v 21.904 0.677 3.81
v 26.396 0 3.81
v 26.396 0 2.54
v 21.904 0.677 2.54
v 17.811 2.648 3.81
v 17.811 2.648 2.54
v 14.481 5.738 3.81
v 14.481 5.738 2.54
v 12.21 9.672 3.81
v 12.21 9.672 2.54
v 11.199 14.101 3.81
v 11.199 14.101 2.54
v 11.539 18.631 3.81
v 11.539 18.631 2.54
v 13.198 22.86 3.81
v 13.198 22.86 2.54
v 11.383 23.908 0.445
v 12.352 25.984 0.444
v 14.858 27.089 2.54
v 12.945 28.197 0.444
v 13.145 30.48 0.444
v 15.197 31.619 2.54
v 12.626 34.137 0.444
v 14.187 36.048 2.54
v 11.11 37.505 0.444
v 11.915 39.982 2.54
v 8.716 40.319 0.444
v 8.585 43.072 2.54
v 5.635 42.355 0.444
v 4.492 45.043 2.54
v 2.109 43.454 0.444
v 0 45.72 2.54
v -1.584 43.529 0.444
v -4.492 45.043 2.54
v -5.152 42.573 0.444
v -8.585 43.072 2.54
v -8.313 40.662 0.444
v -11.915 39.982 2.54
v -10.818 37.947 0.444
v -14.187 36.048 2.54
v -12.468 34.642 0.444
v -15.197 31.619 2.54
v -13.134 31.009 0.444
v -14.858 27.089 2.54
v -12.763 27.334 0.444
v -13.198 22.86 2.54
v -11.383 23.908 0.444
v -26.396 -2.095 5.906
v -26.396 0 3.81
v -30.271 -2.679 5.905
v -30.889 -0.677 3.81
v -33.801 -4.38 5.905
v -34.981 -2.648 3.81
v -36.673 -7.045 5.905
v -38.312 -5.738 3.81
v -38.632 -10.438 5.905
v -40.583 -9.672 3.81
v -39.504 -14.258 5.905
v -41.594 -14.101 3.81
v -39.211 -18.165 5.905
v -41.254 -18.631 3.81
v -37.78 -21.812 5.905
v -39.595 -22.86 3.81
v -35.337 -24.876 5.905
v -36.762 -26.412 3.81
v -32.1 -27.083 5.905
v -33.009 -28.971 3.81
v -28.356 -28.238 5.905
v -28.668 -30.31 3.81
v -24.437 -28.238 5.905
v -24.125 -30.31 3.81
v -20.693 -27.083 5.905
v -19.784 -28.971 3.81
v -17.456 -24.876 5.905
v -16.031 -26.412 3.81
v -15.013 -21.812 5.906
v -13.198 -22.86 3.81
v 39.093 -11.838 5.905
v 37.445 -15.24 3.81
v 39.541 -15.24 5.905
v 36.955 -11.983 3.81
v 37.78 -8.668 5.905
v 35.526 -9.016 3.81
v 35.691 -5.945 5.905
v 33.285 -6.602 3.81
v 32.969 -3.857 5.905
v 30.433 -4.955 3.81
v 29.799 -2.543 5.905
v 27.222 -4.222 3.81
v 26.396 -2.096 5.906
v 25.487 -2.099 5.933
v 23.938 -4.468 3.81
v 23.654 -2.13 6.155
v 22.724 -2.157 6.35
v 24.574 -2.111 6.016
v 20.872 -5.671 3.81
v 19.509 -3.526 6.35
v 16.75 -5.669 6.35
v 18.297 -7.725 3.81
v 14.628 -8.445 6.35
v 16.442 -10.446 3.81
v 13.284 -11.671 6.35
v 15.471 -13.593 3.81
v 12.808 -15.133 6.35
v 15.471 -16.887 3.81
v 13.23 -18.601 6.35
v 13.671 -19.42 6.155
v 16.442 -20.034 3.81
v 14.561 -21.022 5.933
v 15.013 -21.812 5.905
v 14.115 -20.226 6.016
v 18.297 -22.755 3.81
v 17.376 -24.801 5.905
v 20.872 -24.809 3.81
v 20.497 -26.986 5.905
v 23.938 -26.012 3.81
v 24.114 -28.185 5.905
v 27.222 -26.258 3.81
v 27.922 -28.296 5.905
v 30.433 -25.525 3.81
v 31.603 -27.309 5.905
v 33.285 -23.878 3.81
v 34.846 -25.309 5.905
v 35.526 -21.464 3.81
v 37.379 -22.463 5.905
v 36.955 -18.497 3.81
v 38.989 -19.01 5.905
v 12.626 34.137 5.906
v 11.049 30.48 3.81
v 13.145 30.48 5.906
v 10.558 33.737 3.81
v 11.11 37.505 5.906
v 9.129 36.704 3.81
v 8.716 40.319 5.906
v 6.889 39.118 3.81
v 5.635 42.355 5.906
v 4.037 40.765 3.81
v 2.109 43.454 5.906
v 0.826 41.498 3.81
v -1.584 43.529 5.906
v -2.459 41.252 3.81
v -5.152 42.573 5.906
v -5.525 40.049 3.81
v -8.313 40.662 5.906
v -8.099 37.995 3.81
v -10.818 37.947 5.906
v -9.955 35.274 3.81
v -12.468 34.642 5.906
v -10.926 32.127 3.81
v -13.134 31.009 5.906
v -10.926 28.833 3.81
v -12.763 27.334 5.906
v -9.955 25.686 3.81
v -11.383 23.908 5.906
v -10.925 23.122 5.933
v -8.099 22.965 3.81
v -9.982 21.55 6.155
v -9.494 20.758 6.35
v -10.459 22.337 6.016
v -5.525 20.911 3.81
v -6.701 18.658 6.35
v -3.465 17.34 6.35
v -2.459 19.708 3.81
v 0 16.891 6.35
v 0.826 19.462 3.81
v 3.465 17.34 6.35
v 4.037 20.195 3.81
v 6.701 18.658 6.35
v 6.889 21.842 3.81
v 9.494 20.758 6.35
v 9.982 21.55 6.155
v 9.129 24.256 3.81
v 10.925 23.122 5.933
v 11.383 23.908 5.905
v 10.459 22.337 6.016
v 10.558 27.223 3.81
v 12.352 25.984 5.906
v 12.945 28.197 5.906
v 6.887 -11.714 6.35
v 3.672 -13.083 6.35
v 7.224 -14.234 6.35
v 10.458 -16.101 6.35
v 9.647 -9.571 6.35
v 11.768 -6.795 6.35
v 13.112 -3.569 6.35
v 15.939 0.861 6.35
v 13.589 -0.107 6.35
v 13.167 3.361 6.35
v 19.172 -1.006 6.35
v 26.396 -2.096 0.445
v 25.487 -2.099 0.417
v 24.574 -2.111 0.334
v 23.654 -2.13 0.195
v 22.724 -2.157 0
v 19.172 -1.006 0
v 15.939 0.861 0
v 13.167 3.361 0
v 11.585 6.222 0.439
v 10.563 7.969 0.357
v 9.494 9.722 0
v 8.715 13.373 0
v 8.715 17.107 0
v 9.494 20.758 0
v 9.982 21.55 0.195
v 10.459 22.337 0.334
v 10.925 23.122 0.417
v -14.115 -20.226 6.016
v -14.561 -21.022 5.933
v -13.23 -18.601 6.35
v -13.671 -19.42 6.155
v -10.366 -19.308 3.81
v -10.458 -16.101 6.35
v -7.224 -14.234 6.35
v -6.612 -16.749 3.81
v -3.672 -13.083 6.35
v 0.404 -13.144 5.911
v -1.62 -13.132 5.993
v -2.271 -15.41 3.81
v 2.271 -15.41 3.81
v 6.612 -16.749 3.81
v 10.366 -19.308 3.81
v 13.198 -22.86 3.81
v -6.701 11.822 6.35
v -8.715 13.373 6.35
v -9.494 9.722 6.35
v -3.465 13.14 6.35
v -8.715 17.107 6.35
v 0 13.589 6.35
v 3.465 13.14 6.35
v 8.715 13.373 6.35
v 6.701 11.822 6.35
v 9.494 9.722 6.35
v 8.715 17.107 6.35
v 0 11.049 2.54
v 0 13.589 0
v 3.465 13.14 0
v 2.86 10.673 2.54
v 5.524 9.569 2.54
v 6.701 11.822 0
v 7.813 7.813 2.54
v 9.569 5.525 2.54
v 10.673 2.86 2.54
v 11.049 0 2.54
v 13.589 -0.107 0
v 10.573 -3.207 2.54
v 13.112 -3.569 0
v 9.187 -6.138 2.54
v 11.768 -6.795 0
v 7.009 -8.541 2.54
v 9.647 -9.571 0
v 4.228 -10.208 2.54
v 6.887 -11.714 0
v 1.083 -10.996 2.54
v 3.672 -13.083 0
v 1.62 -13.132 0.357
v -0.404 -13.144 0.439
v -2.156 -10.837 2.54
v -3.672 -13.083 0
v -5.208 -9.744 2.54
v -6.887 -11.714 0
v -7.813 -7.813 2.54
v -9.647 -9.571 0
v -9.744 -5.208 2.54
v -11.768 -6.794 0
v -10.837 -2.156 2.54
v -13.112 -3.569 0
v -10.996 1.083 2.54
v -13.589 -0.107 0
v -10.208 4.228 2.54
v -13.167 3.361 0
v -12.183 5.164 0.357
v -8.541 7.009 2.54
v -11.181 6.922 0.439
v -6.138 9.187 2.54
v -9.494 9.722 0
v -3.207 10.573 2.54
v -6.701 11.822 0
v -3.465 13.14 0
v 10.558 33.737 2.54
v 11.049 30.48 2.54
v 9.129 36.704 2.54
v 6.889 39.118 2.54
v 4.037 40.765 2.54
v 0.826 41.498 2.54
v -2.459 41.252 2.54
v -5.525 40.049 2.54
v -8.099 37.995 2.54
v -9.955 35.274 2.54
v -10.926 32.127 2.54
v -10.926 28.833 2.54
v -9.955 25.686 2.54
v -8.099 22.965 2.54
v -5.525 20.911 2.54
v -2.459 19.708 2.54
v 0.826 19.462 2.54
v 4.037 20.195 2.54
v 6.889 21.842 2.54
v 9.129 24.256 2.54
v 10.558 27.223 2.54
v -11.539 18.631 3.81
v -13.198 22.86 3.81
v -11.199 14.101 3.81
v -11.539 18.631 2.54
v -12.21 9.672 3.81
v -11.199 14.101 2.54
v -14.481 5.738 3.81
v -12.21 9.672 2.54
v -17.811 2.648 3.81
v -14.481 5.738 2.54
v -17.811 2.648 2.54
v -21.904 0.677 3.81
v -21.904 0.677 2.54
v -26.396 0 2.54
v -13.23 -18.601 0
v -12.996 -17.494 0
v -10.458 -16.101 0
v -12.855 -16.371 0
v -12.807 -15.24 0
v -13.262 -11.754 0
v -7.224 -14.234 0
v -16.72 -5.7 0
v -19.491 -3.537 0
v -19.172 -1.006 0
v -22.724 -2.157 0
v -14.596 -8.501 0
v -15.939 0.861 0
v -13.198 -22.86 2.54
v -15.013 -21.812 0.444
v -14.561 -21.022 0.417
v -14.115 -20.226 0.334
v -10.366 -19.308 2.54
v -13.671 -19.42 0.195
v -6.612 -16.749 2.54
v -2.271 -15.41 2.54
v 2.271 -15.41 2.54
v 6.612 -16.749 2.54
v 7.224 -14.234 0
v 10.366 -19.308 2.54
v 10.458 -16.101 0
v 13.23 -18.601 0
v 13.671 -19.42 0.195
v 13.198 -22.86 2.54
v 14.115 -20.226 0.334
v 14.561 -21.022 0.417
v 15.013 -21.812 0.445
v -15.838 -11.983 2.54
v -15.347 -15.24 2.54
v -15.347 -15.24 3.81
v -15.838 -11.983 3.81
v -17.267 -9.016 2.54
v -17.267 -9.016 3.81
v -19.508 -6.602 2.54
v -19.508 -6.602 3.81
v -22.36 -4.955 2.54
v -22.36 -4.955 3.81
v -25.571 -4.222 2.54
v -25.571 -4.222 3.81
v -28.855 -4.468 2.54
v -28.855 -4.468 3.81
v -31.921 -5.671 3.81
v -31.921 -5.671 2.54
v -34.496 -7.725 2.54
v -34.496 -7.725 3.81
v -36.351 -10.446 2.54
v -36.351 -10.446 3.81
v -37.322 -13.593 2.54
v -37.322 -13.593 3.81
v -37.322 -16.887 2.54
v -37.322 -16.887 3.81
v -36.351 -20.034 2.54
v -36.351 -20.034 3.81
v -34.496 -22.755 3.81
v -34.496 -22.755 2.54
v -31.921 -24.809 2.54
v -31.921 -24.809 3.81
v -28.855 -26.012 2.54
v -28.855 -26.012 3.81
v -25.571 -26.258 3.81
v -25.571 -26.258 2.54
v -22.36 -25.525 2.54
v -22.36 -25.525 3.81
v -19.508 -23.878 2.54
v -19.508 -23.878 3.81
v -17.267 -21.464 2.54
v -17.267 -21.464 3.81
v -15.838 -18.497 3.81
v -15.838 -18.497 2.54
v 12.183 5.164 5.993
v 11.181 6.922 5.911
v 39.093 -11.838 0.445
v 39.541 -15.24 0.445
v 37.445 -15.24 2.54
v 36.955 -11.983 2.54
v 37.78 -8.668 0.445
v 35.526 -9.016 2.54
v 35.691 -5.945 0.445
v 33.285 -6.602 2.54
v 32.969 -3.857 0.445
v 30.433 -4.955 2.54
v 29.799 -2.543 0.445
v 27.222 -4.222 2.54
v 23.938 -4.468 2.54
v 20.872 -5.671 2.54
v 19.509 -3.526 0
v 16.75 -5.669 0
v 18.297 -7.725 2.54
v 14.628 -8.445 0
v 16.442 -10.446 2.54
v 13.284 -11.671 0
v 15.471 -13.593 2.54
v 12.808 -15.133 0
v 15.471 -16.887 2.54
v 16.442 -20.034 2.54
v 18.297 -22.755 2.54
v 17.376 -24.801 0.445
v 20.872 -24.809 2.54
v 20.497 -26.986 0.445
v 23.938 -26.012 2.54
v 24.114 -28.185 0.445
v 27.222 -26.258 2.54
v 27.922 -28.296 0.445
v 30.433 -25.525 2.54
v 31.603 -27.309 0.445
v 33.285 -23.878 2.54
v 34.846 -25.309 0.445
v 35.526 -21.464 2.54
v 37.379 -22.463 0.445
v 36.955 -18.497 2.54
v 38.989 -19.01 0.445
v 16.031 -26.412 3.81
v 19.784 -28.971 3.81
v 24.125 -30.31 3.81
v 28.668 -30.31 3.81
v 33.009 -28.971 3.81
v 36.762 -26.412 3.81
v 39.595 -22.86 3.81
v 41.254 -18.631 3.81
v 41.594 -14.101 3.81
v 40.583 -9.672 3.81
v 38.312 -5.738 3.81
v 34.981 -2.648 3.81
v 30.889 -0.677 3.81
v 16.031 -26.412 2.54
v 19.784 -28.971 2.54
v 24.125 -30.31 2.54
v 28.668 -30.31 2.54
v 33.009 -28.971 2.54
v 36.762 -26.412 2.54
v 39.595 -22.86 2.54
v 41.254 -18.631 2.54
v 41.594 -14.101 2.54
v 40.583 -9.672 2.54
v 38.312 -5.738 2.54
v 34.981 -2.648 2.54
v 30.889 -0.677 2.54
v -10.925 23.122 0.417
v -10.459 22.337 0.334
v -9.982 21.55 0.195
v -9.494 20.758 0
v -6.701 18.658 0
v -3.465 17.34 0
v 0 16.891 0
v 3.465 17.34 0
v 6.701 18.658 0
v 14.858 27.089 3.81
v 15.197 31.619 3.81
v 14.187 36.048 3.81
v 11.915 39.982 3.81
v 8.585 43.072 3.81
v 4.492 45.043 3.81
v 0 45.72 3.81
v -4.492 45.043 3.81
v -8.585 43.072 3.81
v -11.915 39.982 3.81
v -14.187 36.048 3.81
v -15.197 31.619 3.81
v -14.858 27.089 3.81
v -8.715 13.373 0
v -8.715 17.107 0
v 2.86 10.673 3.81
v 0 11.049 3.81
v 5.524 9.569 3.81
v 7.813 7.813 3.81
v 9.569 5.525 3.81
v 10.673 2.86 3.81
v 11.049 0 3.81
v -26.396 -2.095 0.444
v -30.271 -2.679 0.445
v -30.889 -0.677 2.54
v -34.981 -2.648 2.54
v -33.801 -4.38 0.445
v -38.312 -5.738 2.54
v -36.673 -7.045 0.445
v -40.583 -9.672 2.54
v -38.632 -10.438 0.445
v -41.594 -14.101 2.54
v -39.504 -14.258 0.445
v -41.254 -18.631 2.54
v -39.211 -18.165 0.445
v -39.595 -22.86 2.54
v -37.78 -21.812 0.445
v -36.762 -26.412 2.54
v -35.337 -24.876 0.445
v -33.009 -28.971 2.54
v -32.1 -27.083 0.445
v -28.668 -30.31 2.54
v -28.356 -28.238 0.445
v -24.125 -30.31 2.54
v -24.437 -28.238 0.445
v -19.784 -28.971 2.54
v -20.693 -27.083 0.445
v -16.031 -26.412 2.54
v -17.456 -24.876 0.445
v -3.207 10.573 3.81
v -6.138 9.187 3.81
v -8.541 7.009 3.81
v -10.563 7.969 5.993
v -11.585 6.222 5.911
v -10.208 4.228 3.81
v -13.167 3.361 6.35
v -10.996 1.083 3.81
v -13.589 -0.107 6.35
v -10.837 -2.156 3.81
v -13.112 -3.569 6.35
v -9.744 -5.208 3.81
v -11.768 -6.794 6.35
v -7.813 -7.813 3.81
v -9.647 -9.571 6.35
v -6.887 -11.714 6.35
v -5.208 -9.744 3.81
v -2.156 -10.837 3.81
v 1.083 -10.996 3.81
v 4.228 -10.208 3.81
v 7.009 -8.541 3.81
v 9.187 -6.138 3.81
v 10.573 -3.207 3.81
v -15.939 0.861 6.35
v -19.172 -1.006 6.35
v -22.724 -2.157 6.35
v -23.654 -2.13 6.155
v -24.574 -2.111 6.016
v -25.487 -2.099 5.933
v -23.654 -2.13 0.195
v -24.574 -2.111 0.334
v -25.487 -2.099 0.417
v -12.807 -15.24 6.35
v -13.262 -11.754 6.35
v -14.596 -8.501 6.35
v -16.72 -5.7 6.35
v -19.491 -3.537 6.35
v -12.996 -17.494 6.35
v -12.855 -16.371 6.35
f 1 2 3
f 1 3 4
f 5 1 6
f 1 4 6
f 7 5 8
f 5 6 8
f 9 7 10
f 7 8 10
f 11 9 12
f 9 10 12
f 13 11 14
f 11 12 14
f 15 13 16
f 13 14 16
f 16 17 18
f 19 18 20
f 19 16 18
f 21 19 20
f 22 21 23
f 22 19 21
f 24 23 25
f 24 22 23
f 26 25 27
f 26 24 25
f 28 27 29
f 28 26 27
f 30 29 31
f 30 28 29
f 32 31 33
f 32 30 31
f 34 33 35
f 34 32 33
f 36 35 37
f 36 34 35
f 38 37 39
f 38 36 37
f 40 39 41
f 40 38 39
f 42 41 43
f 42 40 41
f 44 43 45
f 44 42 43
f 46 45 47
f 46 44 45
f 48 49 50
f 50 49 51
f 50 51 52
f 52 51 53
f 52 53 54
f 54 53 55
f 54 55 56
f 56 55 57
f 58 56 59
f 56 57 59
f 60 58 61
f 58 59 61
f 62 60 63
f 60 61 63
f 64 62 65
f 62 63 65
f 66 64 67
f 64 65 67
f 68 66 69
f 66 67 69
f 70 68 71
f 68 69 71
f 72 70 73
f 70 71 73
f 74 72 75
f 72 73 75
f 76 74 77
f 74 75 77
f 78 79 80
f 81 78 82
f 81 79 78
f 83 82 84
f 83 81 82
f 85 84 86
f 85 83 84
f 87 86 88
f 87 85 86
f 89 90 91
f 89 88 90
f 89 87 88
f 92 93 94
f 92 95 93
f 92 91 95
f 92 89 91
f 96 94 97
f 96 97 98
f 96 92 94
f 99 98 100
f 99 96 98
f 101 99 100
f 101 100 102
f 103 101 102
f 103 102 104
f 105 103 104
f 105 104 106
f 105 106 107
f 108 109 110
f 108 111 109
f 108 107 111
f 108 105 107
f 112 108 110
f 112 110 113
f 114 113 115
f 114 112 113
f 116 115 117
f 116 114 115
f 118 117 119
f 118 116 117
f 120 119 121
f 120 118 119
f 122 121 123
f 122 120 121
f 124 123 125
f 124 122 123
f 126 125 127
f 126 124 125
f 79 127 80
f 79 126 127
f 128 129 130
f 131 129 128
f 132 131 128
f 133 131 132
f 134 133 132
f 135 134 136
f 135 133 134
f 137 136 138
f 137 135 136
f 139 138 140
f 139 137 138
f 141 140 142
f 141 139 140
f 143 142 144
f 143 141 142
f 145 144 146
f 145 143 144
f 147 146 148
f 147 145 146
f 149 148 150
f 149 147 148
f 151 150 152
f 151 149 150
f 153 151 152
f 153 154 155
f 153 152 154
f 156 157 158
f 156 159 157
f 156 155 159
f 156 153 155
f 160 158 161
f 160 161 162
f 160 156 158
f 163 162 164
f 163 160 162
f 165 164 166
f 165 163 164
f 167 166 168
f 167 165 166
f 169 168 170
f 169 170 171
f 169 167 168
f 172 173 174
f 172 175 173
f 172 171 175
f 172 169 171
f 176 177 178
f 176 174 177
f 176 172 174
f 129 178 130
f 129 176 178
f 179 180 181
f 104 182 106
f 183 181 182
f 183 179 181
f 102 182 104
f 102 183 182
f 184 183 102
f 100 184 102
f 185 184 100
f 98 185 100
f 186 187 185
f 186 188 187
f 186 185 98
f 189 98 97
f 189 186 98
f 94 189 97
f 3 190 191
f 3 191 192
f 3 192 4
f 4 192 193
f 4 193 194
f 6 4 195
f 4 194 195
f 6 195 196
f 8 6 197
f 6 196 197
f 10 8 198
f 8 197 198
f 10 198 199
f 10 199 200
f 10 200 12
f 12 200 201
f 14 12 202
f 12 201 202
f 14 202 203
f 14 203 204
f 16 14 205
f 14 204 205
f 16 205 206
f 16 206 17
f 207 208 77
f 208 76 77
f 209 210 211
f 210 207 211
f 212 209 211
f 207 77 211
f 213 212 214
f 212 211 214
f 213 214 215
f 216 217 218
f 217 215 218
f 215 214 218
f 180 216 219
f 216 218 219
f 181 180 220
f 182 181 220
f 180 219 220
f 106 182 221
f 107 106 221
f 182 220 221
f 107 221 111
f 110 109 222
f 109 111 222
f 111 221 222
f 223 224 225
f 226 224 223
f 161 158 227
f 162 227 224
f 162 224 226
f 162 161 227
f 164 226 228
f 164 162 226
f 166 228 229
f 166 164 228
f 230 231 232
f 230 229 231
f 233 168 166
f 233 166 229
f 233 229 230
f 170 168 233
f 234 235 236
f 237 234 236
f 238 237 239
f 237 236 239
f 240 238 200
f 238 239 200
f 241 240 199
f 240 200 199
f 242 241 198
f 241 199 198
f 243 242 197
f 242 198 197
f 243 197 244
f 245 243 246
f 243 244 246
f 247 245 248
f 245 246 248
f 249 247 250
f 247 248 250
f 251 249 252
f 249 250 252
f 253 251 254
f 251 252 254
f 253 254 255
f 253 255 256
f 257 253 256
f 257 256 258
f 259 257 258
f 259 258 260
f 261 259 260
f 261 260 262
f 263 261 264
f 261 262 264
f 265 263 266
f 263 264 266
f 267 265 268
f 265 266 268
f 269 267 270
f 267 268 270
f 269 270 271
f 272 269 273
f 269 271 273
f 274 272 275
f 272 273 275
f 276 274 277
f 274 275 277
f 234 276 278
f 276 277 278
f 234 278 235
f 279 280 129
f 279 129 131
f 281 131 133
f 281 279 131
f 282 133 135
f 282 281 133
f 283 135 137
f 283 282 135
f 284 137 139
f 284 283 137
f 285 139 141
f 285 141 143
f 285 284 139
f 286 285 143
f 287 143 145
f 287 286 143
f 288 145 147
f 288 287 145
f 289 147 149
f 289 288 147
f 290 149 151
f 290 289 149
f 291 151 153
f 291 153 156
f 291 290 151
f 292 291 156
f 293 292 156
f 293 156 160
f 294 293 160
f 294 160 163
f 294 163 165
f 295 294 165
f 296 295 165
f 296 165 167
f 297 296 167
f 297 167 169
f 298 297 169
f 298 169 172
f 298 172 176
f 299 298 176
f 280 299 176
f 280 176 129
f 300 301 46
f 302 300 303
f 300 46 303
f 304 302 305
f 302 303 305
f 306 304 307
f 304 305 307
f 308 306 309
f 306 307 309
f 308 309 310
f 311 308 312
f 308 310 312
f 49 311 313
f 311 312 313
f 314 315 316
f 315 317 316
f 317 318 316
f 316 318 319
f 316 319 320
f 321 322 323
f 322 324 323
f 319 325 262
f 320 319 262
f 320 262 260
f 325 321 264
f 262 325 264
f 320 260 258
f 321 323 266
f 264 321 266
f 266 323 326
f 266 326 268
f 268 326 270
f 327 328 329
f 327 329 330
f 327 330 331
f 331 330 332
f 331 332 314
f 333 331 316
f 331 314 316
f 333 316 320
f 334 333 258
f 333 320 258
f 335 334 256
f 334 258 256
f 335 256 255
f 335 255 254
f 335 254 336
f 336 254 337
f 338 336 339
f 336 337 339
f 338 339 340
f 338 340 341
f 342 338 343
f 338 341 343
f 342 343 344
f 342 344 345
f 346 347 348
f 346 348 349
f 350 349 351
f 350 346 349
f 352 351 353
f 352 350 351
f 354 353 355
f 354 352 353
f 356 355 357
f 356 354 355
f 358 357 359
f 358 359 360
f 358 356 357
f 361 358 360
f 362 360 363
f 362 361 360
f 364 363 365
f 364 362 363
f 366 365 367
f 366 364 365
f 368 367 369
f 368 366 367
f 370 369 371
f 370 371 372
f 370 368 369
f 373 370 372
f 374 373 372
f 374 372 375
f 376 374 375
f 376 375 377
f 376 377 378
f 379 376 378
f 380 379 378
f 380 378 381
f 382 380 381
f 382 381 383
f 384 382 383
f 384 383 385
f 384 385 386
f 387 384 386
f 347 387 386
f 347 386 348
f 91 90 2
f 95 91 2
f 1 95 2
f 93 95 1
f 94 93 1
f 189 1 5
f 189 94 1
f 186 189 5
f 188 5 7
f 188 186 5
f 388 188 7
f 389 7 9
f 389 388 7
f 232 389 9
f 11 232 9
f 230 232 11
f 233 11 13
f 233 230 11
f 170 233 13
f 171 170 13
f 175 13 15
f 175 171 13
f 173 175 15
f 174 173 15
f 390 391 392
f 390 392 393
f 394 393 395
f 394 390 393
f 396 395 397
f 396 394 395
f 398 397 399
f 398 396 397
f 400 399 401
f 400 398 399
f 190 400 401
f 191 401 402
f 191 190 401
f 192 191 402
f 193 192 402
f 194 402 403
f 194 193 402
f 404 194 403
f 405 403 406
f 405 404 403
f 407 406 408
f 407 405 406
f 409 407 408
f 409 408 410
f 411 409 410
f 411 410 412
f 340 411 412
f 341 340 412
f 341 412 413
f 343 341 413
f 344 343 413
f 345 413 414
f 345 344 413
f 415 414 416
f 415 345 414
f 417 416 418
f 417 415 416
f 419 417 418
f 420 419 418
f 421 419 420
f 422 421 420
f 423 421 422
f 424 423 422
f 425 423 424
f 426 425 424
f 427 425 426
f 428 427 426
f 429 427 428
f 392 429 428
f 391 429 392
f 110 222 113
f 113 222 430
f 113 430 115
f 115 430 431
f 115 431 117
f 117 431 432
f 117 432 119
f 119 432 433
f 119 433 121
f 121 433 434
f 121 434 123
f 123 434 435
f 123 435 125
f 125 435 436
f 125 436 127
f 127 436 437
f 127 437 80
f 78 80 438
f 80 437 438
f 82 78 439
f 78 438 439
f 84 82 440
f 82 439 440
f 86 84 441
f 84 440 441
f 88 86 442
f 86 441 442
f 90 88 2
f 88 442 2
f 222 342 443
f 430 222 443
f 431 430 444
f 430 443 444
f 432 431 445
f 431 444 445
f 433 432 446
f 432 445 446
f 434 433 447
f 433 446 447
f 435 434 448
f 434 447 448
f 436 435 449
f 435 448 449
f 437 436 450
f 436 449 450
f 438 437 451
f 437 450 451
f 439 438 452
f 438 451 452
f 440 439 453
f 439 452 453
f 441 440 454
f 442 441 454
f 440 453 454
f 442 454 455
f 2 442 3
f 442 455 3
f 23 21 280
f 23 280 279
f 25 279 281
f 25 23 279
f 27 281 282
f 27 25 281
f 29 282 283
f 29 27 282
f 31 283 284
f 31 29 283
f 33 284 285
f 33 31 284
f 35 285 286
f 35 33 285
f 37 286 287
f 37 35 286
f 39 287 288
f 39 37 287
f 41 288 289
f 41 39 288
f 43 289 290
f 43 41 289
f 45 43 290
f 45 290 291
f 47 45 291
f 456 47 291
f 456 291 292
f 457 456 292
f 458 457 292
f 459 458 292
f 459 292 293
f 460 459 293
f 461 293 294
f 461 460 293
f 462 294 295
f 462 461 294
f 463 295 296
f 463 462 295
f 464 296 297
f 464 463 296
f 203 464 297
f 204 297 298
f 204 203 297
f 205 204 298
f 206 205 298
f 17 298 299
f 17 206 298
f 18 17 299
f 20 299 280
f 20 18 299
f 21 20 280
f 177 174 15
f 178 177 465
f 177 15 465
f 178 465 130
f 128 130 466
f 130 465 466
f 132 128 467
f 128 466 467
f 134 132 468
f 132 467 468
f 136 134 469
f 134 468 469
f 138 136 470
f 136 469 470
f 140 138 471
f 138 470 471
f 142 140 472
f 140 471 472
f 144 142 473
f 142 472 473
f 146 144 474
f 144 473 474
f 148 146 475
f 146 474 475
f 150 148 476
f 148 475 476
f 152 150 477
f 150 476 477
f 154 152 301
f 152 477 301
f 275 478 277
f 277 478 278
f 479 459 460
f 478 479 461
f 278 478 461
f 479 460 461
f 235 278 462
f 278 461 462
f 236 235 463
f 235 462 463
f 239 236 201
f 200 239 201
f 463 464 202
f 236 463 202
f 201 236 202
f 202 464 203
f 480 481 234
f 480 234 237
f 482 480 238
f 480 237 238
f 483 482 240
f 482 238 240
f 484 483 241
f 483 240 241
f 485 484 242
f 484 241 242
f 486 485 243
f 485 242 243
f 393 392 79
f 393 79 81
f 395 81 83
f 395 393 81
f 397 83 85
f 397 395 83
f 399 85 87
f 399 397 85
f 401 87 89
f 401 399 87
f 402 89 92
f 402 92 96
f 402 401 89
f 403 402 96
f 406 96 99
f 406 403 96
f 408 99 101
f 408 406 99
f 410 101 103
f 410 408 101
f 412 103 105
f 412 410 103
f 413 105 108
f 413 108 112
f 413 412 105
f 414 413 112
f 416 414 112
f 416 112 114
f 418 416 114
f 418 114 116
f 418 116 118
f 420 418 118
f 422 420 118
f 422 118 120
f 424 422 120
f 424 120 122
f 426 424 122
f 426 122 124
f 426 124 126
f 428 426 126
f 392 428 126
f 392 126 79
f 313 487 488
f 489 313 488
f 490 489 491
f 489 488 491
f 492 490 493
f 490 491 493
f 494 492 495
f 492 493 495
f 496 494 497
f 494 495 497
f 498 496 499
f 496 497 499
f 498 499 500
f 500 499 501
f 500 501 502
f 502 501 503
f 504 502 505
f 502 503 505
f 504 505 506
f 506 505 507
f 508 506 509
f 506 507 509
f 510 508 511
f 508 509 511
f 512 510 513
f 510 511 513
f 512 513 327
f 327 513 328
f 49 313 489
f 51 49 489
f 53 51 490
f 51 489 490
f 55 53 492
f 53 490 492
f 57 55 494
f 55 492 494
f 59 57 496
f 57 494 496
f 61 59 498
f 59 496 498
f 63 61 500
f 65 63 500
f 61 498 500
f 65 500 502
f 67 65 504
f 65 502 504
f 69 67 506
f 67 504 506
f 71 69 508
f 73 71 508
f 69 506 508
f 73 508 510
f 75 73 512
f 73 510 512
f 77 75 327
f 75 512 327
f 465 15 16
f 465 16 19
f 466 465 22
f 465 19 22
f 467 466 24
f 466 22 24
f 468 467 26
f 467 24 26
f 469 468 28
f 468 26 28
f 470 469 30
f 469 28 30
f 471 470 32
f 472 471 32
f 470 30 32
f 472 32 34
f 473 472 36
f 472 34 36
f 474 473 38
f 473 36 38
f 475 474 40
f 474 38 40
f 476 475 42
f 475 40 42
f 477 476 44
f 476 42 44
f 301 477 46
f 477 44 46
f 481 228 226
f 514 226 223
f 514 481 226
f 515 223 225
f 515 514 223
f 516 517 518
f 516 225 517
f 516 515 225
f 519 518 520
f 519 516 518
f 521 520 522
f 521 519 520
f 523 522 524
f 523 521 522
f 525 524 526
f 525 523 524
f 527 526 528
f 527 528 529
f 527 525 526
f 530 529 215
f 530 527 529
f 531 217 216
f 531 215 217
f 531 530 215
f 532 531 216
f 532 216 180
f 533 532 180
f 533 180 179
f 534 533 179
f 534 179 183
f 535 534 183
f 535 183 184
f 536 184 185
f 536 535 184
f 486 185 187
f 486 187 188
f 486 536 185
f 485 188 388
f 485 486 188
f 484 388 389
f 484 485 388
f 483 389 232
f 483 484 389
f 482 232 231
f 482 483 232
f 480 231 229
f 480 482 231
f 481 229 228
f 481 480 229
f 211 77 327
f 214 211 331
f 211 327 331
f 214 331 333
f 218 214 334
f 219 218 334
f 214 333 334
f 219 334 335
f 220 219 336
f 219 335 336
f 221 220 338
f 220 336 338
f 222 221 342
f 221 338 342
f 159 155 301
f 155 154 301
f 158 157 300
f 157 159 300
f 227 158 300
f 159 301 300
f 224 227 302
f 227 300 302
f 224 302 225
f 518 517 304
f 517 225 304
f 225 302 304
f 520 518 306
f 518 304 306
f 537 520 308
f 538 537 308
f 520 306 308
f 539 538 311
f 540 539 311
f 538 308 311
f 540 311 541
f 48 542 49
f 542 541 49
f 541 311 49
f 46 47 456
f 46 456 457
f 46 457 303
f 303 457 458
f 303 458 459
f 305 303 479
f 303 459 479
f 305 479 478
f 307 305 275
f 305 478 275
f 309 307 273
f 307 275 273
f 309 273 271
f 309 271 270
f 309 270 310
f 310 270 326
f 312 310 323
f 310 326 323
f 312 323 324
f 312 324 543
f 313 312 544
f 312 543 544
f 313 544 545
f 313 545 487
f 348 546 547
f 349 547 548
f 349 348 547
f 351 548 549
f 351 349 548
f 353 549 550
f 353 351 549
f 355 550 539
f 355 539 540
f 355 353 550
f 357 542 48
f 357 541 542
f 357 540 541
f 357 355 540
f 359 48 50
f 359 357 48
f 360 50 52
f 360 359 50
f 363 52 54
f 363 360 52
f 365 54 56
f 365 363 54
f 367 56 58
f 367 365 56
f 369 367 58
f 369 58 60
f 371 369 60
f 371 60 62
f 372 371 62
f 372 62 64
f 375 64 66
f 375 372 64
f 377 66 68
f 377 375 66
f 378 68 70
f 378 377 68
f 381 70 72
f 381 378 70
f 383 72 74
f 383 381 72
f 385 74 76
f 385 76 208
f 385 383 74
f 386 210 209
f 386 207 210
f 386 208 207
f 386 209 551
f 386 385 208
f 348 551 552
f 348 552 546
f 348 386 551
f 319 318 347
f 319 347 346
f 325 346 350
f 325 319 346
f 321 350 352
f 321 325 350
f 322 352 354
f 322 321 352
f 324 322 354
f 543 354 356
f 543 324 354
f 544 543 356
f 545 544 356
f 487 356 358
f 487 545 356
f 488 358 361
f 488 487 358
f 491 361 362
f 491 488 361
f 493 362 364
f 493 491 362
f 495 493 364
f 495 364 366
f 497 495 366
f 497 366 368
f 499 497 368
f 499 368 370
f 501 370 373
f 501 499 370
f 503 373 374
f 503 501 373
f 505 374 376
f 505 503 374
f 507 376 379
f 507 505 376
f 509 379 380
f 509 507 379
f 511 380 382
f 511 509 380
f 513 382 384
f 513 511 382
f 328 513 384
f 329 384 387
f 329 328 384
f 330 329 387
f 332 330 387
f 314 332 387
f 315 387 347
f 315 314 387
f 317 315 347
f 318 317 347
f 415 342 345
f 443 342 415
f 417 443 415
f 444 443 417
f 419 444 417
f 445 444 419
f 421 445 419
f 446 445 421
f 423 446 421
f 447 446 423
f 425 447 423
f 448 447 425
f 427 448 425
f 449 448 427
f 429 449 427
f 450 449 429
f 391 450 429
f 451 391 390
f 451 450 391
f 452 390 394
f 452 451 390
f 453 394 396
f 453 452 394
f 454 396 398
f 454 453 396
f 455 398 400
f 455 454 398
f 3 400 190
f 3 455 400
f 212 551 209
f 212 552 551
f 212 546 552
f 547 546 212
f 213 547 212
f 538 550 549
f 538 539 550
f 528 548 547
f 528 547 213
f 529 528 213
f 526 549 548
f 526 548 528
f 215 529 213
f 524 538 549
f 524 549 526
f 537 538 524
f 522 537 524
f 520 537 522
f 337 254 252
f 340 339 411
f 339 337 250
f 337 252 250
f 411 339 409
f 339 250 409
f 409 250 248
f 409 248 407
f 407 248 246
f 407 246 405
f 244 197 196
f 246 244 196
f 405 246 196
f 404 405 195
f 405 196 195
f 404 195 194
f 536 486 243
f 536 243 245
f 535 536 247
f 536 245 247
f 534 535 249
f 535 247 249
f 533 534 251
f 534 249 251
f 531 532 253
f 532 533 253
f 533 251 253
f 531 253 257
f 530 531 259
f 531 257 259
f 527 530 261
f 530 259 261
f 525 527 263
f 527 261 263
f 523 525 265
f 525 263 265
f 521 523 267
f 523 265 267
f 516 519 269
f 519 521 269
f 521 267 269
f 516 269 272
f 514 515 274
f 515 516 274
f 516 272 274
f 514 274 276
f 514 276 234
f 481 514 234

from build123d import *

# Parameters (mm, degrees)
F0_R         = 11.049
F1_DEPTH     = 6.35
F2_T2_ANGLE  = 120
F2_T4_ANGLE  = 240
F2_T6_ANGLE  = 120
F2_T8_ANGLE  = 240
F2_T10_ANGLE = 120
F2_T12_ANGLE = 240
F2_T22_ANGLE = 120
F2_T24_ANGLE = 240
F2_T26_ANGLE = 120
F2_T28_ANGLE = 240
F2_T30_ANGLE = 120
F2_T32_ANGLE = 240


# Not quite as in the source:
# - a fillet or chamfer that OpenCascade refuses, or shapes differently, is made with other operations: its cross-section is extruded or revolved along the edge and cut away or added


with BuildPart() as f1:
    # F0 (on Top) → F1 (new body)
    with BuildSketch(Plane.XY):
        with BuildLine():
            ThreePointArc((26.3964543073, 0), (13.1982271537, 7.62), (13.1982271537, 22.86))
            ThreePointArc((13.1982271537, 22.86), (0, 45.72), (-13.1982271537, 22.86))
            ThreePointArc((-13.1982271537, 22.86), (-13.1982271537, 7.62), (-26.3964543073, 0))
            ThreePointArc((-26.3964543073, 0), (-39.594681461, -22.86), (-13.1982271537, -22.86))
            ThreePointArc((-13.1982271537, -22.86), (0, -15.24), (13.1982271537, -22.86))
            ThreePointArc((13.1982271537, -22.86), (39.594681461, -22.86), (26.3964543073, 0))
        make_face()
        with Locations((-26.3964543073, -15.24)):
            Circle(F0_R, mode=Mode.SUBTRACT)
        with Locations((26.3964543073, -15.24)):
            Circle(F0_R, mode=Mode.SUBTRACT)
        with BuildLine():
            ThreePointArc((0, 11.049), (7.8128228253, 7.8128228253), (11.049, 0))
            ThreePointArc((11.049, 0), (-7.8128228253, -7.8128228253), (0, 11.049))
        make_face(mode=Mode.SUBTRACT)
        with Locations((0, 30.48)):
            Circle(F0_R, mode=Mode.SUBTRACT)
    extrude(amount=F1_DEPTH)

    # F2: chamfer of 2.54 on 20 edges, made by hand

    # F2_s1 → F2_t2 (revolve, cut)
    with BuildSketch(Plane.YZ.offset(26.3964543073)):
        Polygon((0, 3.81), (-2.54, 6.35), (0, 6.35), align=None)
    revolve(axis=Axis((26.3964543073, 15.24, 6.35), (0, 0, -1)), revolution_arc=F2_T2_ANGLE, mode=Mode.SUBTRACT)

    # F2_s3 → F2_t4 (revolve, cut)
    with BuildSketch(Plane(origin=(13.1982271537, 22.86, 0), x_dir=(0, 0, 1), z_dir=(-0.5, -0.8660254038, 0))):
        Polygon((6.35, 2.54), (3.81, 0), (6.35, 0), align=None)
    revolve(axis=Axis((0, 30.48, 6.35), (0, 0, 1)), revolution_arc=F2_T4_ANGLE, mode=Mode.SUBTRACT)

    # F2_s5 → F2_t6 (revolve, cut)
    with BuildSketch(Plane(origin=(-13.1982271537, 22.86, 0), x_dir=(0, 0, 1), z_dir=(-0.5, 0.8660254038, 0))):
        Polygon((6.35, 2.54), (3.81, 0), (6.35, 0), align=None)
    revolve(axis=Axis((-26.3964543073, 15.24, 6.35), (0, 0, -1)), revolution_arc=F2_T6_ANGLE, mode=Mode.SUBTRACT)

    # F2_s7 → F2_t8 (revolve, cut)
    with BuildSketch(Plane.YZ.offset(-26.3964543073)):
        Polygon((-2.54, 6.35), (0, 3.81), (0, 6.35), align=None)
    revolve(axis=Axis((-26.3964543073, -15.24, 6.35), (0, 0, 1)), revolution_arc=F2_T8_ANGLE, mode=Mode.SUBTRACT)

    # F2_s9 → F2_t10 (revolve, cut)
    with BuildSketch(Plane(origin=(-13.1982271537, -22.86, 0), x_dir=(0, 0, 1), z_dir=(-0.5, -0.8660254038, 0))):
        Polygon((6.35, 2.54), (3.81, 0), (6.35, 0), align=None)
    revolve(axis=Axis((0, -30.48, 6.35), (0, 0, -1)), revolution_arc=F2_T10_ANGLE, mode=Mode.SUBTRACT)

    # F2_s11 → F2_t12 (revolve, cut)
    with BuildSketch(Plane(origin=(13.1982271537, -22.86, 0), x_dir=(0, 0, 1), z_dir=(-0.5, 0.8660254038, 0))):
        Polygon((6.35, 2.54), (3.81, 0), (6.35, 0), align=None)
    revolve(axis=Axis((26.3964543073, -15.24, 6.35), (0, 0, 1)), revolution_arc=F2_T12_ANGLE, mode=Mode.SUBTRACT)

    # F2_s13 → F2_t14 (revolve, cut)
    with BuildSketch(Plane.XZ.offset(15.24)):
        Polygon((-12.8074543073, 6.35), (-15.3474543073, 3.81), (-15.3474543073, 6.35), align=None)
    revolve(axis=Axis((-26.3964543073, -15.24, 6.35), (0, 0, 1)), mode=Mode.SUBTRACT)

    # F2_s15 → F2_t16 (revolve, cut)
    with BuildSketch(Plane.XZ.offset(15.24)):
        Polygon((39.9854543073, 6.35), (37.4454543073, 3.81), (37.4454543073, 6.35), align=None)
    revolve(axis=Axis((26.3964543073, -15.24, 6.35), (0, 0, 1)), mode=Mode.SUBTRACT)

    # F2_s17 → F2_t18 (revolve, cut)
    with BuildSketch(Plane.YZ):
        Polygon((13.589, 6.35), (11.049, 3.81), (11.049, 6.35), align=None)
    revolve(axis=Axis((0, 0, 6.35), (0, 0, 1)), mode=Mode.SUBTRACT)

    # F2_s19 → F2_t20 (revolve, cut)
    with BuildSketch(Plane.XZ.offset(-30.48)):
        Polygon((13.589, 6.35), (11.049, 3.81), (11.049, 6.35), align=None)
    revolve(axis=Axis((0, 30.48, 6.35), (0, 0, 1)), mode=Mode.SUBTRACT)

    # F2_s21 → F2_t22 (revolve, cut)
    with BuildSketch(Plane.YZ.offset(26.3964543073)):
        Polygon((0, 2.54), (-2.54, 0), (0, 0), align=None)
    revolve(axis=Axis((26.3964543073, 15.24, 0), (0, 0, -1)), revolution_arc=F2_T22_ANGLE, mode=Mode.SUBTRACT)

    # F2_s23 → F2_t24 (revolve, cut)
    with BuildSketch(Plane(origin=(13.1982271537, 22.86, 0), x_dir=(0, 0, 1), z_dir=(-0.5, -0.8660254038, 0))):
        Polygon((0, 2.54), (2.54, 0), (0, 0), align=None)
    revolve(axis=Axis((0, 30.48, 0), (0, 0, 1)), revolution_arc=F2_T24_ANGLE, mode=Mode.SUBTRACT)

    # F2_s25 → F2_t26 (revolve, cut)
    with BuildSketch(Plane(origin=(-13.1982271537, 22.86, 0), x_dir=(0, 0, 1), z_dir=(-0.5, 0.8660254038, 0))):
        Polygon((2.54, 0), (0, 2.54), (0, 0), align=None)
    revolve(axis=Axis((-26.3964543073, 15.24, 0), (0, 0, -1)), revolution_arc=F2_T26_ANGLE, mode=Mode.SUBTRACT)

    # F2_s27 → F2_t28 (revolve, cut)
    with BuildSketch(Plane.YZ.offset(-26.3964543073)):
        Polygon((0, 2.54), (-2.54, 0), (0, 0), align=None)
    revolve(axis=Axis((-26.3964543073, -15.24, 0), (0, 0, 1)), revolution_arc=F2_T28_ANGLE, mode=Mode.SUBTRACT)

    # F2_s29 → F2_t30 (revolve, cut)
    with BuildSketch(Plane(origin=(-13.1982271537, -22.86, 0), x_dir=(0, 0, 1), z_dir=(-0.5, -0.8660254038, 0))):
        Polygon((2.54, 0), (0, 2.54), (0, 0), align=None)
    revolve(axis=Axis((0, -30.48, 0), (0, 0, -1)), revolution_arc=F2_T30_ANGLE, mode=Mode.SUBTRACT)

    # F2_s31 → F2_t32 (revolve, cut)
    with BuildSketch(Plane(origin=(13.1982271537, -22.86, 0), x_dir=(0, 0, 1), z_dir=(-0.5, 0.8660254038, 0))):
        Polygon((0, 2.54), (2.54, 0), (0, 0), align=None)
    revolve(axis=Axis((26.3964543073, -15.24, 0), (0, 0, 1)), revolution_arc=F2_T32_ANGLE, mode=Mode.SUBTRACT)

    # F2_s33 → F2_t34 (revolve, cut)
    with BuildSketch(Plane.XZ.offset(15.24)):
        Polygon((-15.3474543073, 2.54), (-12.8074543073, 0), (-15.3474543073, 0), align=None)
    revolve(axis=Axis((-26.3964543073, -15.24, 0), (0, 0, 1)), mode=Mode.SUBTRACT)

    # F2_s35 → F2_t36 (revolve, cut)
    with BuildSketch(Plane.XZ.offset(15.24)):
        Polygon((37.4454543073, 2.54), (39.9854543073, 0), (37.4454543073, 0), align=None)
    revolve(axis=Axis((26.3964543073, -15.24, 0), (0, 0, 1)), mode=Mode.SUBTRACT)

    # F2_s37 → F2_t38 (revolve, cut)
    with BuildSketch(Plane.YZ):
        Polygon((11.049, 2.54), (13.589, 0), (11.049, 0), align=None)
    revolve(axis=Axis((0, 0, 0), (0, 0, -1)), mode=Mode.SUBTRACT)

    # F2_s39 → F2_t40 (revolve, cut)
    with BuildSketch(Plane.XZ.offset(-30.48)):
        Polygon((11.049, 2.54), (13.589, 0), (11.049, 0), align=None)
    revolve(axis=Axis((0, 30.48, 0), (0, 0, 1)), mode=Mode.SUBTRACT)


solid = f1.part
